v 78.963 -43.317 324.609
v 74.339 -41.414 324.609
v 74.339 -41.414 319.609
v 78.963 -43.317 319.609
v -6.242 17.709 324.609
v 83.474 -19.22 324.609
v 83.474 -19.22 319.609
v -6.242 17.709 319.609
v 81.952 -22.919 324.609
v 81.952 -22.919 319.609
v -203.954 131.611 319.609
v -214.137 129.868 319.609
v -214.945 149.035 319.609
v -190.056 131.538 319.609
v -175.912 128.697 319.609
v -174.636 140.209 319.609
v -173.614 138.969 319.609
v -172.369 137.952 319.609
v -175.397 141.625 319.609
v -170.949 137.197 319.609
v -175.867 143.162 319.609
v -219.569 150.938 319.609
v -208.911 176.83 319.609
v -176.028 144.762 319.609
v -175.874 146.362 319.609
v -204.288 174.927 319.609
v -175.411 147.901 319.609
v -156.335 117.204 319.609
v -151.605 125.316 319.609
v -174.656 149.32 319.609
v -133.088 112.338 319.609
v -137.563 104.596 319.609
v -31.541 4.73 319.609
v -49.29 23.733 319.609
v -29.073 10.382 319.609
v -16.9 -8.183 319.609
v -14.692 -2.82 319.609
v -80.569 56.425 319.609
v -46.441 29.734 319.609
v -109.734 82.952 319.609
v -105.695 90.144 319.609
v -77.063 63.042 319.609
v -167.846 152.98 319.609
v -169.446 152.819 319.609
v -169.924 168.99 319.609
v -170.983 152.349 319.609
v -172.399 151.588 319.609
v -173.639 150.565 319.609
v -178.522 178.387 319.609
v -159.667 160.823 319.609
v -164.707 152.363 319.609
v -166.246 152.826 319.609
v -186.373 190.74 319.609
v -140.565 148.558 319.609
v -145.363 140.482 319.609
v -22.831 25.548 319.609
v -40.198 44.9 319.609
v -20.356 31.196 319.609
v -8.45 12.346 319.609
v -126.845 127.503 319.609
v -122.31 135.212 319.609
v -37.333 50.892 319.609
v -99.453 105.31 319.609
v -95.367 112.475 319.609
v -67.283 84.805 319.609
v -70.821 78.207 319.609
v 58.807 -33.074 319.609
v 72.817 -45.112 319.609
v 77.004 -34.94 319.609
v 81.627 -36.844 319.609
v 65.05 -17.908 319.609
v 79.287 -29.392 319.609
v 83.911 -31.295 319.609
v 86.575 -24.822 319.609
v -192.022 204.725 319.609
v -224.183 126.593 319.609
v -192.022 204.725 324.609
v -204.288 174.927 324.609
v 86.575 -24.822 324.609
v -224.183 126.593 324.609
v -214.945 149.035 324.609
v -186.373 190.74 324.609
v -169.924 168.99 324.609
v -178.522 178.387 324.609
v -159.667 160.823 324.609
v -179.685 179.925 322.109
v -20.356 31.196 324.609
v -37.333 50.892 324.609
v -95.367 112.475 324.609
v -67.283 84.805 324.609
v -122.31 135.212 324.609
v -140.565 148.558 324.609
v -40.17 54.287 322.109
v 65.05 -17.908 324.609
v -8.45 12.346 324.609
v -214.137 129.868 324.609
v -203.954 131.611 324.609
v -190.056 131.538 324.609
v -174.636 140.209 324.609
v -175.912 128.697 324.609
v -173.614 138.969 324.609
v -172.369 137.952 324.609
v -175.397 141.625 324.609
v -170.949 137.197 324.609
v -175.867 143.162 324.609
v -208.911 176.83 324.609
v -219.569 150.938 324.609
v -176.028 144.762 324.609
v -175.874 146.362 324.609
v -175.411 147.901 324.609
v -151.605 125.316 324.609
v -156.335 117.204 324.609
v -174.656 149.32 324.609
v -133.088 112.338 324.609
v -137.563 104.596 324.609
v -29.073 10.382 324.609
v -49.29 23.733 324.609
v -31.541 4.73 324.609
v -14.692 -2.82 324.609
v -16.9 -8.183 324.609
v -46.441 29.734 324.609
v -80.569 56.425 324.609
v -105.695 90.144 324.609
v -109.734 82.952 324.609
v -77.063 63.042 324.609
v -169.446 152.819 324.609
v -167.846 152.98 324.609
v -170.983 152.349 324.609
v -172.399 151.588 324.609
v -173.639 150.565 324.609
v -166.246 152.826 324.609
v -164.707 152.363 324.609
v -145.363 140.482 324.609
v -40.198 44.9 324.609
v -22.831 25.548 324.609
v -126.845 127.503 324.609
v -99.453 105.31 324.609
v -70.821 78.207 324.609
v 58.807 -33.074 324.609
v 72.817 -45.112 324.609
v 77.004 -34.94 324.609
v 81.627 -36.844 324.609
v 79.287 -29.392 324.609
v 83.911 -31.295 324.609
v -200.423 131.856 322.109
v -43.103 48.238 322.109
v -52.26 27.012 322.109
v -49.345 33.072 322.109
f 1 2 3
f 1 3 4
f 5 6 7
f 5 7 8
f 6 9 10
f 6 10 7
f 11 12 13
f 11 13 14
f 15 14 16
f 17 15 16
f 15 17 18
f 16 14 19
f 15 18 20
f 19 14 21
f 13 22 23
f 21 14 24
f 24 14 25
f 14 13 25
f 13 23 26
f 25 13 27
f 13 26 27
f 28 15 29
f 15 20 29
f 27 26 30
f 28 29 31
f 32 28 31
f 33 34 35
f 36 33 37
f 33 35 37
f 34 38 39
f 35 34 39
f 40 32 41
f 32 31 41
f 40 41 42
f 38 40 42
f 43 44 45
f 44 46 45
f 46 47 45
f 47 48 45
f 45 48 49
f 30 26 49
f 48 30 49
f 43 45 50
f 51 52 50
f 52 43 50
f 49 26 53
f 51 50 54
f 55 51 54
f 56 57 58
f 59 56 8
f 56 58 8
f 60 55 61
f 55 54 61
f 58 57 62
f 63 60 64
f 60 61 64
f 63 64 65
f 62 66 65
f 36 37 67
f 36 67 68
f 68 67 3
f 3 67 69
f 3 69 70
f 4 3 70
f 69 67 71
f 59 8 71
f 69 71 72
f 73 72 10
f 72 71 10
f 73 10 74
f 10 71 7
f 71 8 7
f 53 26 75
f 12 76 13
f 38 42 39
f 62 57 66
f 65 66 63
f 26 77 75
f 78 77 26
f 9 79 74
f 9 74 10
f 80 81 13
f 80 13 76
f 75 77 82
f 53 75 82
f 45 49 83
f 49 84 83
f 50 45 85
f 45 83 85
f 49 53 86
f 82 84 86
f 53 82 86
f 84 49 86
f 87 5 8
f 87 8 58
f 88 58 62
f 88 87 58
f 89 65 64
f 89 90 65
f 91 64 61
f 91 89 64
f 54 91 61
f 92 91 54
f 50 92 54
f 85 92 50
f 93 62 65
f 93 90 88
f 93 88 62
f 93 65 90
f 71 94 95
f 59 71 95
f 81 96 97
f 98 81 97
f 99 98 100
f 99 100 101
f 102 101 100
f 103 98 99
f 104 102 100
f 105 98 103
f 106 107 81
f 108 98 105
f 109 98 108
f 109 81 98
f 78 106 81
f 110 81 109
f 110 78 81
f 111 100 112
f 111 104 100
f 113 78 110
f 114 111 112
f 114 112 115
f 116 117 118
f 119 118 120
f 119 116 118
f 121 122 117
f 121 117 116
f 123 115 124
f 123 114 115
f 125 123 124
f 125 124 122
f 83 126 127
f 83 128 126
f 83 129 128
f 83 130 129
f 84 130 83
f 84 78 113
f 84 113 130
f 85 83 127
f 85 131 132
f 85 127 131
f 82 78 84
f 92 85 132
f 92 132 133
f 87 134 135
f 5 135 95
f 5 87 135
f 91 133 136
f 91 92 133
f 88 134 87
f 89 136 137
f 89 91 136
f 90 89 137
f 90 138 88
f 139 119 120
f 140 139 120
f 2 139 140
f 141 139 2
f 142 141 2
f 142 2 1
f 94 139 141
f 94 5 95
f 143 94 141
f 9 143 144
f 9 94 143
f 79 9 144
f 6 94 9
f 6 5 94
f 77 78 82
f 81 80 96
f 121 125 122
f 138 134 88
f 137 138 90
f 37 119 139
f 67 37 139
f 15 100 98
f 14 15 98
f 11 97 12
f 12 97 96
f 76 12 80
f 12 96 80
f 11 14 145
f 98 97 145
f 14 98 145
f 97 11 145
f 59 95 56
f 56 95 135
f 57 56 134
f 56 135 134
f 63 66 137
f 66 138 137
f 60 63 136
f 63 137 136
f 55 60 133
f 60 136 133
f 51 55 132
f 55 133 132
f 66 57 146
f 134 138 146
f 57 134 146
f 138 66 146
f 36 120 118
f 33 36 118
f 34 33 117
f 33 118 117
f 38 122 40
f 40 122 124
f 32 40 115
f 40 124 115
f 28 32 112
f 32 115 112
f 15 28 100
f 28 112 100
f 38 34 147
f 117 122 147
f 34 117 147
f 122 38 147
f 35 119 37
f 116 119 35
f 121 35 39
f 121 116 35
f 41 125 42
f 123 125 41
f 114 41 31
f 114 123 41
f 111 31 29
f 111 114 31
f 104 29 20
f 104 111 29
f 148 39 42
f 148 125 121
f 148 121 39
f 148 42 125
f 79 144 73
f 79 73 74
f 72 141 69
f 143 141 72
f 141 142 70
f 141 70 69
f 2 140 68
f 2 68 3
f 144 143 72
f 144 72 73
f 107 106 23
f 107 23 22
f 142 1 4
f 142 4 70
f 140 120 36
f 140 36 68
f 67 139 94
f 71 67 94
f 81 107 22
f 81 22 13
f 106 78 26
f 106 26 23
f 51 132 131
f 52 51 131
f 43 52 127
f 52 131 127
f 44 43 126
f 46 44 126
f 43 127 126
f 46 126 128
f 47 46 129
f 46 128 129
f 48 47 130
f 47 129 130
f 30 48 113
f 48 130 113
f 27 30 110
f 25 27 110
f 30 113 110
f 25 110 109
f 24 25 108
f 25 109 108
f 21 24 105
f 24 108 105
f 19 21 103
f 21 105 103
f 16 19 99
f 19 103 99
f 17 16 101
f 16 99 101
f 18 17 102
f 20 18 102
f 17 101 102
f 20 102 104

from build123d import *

# Parameters (mm, degrees)
BOSS_EXTRUDE1_DEPTH = 5


with BuildPart() as part:
    # Sketch2 → Boss-Extrude1 (new body)
    with BuildSketch(Plane.XY.offset(324.609115736)):
        with BuildLine():
            Line((-16.90012844, -8.183190187), (72.816503584, -45.112441184))
            Line((72.816503584, -45.112441184), (74.339048342, -41.413541691))
            Line((74.339048342, -41.413541691), (78.962672709, -43.316722639))
            Line((78.962672709, -43.316722639), (81.627126035, -36.843648526))
            Line((81.627126035, -36.843648526), (77.003501669, -34.940467578))
            Line((77.003501669, -34.940467578), (79.287318806, -29.392118339))
            Line((79.287318806, -29.392118339), (83.910943172, -31.295299286))
            Line((83.910943172, -31.295299286), (86.575396499, -24.822225173))
            Line((86.575396499, -24.822225173), (81.951772132, -22.919044226))
            Line((81.951772132, -22.919044226), (83.47431689, -19.220144733))
            Line((83.47431689, -19.220144733), (-6.242315134, 17.709106264))
            add(Edge.make_bspline(
                [(-6.242315134, 17.709106264), (-19.147085678, 28.427579084), (-62.609683594, 83.624540664), (-113.341454038, 133.123455083), (-159.667254415, 160.823469136)],
                knots=[0, 0, 0, 0, 0.237148473, 1, 1, 1, 1], degree=3))
            add(Edge.make_bspline(
                [(-192.022205471, 204.724702407), (-183.525718419, 177.076811357), (-159.667254415, 160.823469136)],
                knots=[0, 0, 0, 1, 1, 1], degree=2))
            Line((-192.022205471, 204.724702407), (-204.287606756, 174.926900827))
            Line((-204.287606756, 174.926900827), (-208.911231122, 176.830081774))
            Line((-208.911231122, 176.830081774), (-219.569044429, 150.937785322))
            Line((-219.569044429, 150.937785322), (-214.945420062, 149.034604375))
            Line((-214.945420062, 149.034604375), (-224.18290752, 126.592874832))
            add(Edge.make_bspline(
                [(-175.911850273, 128.697068335), (-200.797987469, 136.066038881), (-224.18290752, 126.592874832)],
                knots=[0, 0, 0, 1, 1, 1], degree=2))
            add(Edge.make_bspline(
                [(-16.90012844, -8.183190187), (-30.222192507, 2.01197393), (-75.852029724, 55.431258283), (-128.517955825, 102.867060046), (-175.911850273, 128.697068335)],
                knots=[0, 0, 0, 0, 0.237148473, 1, 1, 1, 1], degree=3))
        make_face()
        with BuildLine():
            Line((65.049758472, -17.908345143), (-8.450005033, 12.345702))
            add(Edge.make_bspline(
                [(-8.450005033, 12.345702), (-21.566591824, 22.803900379), (-66.124581019, 77.120450197), (-117.836312175, 125.594689972), (-164.70691842, 152.362521961)],
                knots=[0, 0, 0, 0, 0.237148473, 1, 1, 1, 1], degree=3))
            ThreePointArc((-164.70691842, 152.362521961), (-175.410879134, 147.900994755), (-170.949351927, 137.19703404))
            add(Edge.make_bspline(
                [(-14.692438541, -2.819785922), (-27.809025332, 7.638412457), (-72.367014526, 61.954962275), (-124.078745683, 110.429202051), (-170.949351927, 137.19703404)],
                knots=[0, 0, 0, 0, 0.237148473, 1, 1, 1, 1], degree=3))
            Line((-14.692438541, -2.819785922), (58.807324964, -33.073833065))
            Line((58.807324964, -33.073833065), (65.049758472, -17.908345143))
        make_face(mode=Mode.SUBTRACT)
    extrude(amount=-BOSS_EXTRUDE1_DEPTH)


solid = part.part
